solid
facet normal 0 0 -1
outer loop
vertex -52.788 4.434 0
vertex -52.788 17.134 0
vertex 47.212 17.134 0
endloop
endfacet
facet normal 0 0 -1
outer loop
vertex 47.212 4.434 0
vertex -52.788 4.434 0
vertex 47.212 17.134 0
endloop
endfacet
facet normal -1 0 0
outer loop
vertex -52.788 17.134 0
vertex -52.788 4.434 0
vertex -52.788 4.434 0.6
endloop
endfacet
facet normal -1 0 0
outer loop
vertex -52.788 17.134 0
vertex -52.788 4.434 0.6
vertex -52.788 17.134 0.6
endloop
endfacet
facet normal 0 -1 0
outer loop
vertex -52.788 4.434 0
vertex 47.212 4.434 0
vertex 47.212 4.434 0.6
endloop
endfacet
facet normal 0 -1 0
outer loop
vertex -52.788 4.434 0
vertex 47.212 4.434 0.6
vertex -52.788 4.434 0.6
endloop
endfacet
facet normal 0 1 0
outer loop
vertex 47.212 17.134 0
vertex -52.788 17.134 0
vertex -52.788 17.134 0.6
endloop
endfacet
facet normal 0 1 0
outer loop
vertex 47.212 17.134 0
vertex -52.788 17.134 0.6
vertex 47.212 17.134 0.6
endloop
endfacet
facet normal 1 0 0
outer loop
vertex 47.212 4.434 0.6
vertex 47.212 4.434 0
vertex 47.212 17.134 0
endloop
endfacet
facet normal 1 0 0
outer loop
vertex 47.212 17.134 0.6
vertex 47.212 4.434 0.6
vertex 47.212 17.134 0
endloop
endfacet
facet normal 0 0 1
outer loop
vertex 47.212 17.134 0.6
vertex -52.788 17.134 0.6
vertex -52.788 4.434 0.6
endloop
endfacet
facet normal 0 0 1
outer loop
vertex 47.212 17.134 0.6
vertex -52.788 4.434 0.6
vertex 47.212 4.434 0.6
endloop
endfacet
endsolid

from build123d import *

# Parameters (mm, degrees)
ESBO_O1_W                = 100
ESBO_O1_H                = 18
RESSALTO_EXTRUS_O1_DEPTH = 0.6
ESBO_O2_W                = 0.6
ESBO_O2_H                = 3.5
CORTE_EXTRUS_O1_DEPTH    = 100
ESBO_O5_W                = 109.434342877
ESBO_O5_H                = 1.8
CORTE_EXTRUS_O4_DEPTH    = 100


with BuildPart() as part:
    # Esboço1 → Ressalto-extrusão1 (new body)
    with BuildSketch(Plane.XY):
        with Locations((-2.788473849, 8.133956386)):
            Rectangle(ESBO_O1_W, ESBO_O1_H)
    extrude(amount=RESSALTO_EXTRUS_O1_DEPTH)

    # Esboço2 → Corte-extrusão1 (cut)
    with BuildSketch(Plane.ZY.offset(52.788473849)):
        with Locations((0.3, 0.883956386)):
            Rectangle(ESBO_O2_W, ESBO_O2_H)
    extrude(amount=-CORTE_EXTRUS_O1_DEPTH, mode=Mode.SUBTRACT)

    # Esboço5 → Corte-extrusão4 (cut)
    with BuildSketch(Plane(origin=(0, 0, 0), x_dir=(-1, 0, 0), z_dir=(0, 0, -1))):
        with Locations((1.545585964, 3.533956386)):
            Rectangle(ESBO_O5_W, ESBO_O5_H)
    extrude(amount=-CORTE_EXTRUS_O4_DEPTH, mode=Mode.SUBTRACT)


solid = part.part
